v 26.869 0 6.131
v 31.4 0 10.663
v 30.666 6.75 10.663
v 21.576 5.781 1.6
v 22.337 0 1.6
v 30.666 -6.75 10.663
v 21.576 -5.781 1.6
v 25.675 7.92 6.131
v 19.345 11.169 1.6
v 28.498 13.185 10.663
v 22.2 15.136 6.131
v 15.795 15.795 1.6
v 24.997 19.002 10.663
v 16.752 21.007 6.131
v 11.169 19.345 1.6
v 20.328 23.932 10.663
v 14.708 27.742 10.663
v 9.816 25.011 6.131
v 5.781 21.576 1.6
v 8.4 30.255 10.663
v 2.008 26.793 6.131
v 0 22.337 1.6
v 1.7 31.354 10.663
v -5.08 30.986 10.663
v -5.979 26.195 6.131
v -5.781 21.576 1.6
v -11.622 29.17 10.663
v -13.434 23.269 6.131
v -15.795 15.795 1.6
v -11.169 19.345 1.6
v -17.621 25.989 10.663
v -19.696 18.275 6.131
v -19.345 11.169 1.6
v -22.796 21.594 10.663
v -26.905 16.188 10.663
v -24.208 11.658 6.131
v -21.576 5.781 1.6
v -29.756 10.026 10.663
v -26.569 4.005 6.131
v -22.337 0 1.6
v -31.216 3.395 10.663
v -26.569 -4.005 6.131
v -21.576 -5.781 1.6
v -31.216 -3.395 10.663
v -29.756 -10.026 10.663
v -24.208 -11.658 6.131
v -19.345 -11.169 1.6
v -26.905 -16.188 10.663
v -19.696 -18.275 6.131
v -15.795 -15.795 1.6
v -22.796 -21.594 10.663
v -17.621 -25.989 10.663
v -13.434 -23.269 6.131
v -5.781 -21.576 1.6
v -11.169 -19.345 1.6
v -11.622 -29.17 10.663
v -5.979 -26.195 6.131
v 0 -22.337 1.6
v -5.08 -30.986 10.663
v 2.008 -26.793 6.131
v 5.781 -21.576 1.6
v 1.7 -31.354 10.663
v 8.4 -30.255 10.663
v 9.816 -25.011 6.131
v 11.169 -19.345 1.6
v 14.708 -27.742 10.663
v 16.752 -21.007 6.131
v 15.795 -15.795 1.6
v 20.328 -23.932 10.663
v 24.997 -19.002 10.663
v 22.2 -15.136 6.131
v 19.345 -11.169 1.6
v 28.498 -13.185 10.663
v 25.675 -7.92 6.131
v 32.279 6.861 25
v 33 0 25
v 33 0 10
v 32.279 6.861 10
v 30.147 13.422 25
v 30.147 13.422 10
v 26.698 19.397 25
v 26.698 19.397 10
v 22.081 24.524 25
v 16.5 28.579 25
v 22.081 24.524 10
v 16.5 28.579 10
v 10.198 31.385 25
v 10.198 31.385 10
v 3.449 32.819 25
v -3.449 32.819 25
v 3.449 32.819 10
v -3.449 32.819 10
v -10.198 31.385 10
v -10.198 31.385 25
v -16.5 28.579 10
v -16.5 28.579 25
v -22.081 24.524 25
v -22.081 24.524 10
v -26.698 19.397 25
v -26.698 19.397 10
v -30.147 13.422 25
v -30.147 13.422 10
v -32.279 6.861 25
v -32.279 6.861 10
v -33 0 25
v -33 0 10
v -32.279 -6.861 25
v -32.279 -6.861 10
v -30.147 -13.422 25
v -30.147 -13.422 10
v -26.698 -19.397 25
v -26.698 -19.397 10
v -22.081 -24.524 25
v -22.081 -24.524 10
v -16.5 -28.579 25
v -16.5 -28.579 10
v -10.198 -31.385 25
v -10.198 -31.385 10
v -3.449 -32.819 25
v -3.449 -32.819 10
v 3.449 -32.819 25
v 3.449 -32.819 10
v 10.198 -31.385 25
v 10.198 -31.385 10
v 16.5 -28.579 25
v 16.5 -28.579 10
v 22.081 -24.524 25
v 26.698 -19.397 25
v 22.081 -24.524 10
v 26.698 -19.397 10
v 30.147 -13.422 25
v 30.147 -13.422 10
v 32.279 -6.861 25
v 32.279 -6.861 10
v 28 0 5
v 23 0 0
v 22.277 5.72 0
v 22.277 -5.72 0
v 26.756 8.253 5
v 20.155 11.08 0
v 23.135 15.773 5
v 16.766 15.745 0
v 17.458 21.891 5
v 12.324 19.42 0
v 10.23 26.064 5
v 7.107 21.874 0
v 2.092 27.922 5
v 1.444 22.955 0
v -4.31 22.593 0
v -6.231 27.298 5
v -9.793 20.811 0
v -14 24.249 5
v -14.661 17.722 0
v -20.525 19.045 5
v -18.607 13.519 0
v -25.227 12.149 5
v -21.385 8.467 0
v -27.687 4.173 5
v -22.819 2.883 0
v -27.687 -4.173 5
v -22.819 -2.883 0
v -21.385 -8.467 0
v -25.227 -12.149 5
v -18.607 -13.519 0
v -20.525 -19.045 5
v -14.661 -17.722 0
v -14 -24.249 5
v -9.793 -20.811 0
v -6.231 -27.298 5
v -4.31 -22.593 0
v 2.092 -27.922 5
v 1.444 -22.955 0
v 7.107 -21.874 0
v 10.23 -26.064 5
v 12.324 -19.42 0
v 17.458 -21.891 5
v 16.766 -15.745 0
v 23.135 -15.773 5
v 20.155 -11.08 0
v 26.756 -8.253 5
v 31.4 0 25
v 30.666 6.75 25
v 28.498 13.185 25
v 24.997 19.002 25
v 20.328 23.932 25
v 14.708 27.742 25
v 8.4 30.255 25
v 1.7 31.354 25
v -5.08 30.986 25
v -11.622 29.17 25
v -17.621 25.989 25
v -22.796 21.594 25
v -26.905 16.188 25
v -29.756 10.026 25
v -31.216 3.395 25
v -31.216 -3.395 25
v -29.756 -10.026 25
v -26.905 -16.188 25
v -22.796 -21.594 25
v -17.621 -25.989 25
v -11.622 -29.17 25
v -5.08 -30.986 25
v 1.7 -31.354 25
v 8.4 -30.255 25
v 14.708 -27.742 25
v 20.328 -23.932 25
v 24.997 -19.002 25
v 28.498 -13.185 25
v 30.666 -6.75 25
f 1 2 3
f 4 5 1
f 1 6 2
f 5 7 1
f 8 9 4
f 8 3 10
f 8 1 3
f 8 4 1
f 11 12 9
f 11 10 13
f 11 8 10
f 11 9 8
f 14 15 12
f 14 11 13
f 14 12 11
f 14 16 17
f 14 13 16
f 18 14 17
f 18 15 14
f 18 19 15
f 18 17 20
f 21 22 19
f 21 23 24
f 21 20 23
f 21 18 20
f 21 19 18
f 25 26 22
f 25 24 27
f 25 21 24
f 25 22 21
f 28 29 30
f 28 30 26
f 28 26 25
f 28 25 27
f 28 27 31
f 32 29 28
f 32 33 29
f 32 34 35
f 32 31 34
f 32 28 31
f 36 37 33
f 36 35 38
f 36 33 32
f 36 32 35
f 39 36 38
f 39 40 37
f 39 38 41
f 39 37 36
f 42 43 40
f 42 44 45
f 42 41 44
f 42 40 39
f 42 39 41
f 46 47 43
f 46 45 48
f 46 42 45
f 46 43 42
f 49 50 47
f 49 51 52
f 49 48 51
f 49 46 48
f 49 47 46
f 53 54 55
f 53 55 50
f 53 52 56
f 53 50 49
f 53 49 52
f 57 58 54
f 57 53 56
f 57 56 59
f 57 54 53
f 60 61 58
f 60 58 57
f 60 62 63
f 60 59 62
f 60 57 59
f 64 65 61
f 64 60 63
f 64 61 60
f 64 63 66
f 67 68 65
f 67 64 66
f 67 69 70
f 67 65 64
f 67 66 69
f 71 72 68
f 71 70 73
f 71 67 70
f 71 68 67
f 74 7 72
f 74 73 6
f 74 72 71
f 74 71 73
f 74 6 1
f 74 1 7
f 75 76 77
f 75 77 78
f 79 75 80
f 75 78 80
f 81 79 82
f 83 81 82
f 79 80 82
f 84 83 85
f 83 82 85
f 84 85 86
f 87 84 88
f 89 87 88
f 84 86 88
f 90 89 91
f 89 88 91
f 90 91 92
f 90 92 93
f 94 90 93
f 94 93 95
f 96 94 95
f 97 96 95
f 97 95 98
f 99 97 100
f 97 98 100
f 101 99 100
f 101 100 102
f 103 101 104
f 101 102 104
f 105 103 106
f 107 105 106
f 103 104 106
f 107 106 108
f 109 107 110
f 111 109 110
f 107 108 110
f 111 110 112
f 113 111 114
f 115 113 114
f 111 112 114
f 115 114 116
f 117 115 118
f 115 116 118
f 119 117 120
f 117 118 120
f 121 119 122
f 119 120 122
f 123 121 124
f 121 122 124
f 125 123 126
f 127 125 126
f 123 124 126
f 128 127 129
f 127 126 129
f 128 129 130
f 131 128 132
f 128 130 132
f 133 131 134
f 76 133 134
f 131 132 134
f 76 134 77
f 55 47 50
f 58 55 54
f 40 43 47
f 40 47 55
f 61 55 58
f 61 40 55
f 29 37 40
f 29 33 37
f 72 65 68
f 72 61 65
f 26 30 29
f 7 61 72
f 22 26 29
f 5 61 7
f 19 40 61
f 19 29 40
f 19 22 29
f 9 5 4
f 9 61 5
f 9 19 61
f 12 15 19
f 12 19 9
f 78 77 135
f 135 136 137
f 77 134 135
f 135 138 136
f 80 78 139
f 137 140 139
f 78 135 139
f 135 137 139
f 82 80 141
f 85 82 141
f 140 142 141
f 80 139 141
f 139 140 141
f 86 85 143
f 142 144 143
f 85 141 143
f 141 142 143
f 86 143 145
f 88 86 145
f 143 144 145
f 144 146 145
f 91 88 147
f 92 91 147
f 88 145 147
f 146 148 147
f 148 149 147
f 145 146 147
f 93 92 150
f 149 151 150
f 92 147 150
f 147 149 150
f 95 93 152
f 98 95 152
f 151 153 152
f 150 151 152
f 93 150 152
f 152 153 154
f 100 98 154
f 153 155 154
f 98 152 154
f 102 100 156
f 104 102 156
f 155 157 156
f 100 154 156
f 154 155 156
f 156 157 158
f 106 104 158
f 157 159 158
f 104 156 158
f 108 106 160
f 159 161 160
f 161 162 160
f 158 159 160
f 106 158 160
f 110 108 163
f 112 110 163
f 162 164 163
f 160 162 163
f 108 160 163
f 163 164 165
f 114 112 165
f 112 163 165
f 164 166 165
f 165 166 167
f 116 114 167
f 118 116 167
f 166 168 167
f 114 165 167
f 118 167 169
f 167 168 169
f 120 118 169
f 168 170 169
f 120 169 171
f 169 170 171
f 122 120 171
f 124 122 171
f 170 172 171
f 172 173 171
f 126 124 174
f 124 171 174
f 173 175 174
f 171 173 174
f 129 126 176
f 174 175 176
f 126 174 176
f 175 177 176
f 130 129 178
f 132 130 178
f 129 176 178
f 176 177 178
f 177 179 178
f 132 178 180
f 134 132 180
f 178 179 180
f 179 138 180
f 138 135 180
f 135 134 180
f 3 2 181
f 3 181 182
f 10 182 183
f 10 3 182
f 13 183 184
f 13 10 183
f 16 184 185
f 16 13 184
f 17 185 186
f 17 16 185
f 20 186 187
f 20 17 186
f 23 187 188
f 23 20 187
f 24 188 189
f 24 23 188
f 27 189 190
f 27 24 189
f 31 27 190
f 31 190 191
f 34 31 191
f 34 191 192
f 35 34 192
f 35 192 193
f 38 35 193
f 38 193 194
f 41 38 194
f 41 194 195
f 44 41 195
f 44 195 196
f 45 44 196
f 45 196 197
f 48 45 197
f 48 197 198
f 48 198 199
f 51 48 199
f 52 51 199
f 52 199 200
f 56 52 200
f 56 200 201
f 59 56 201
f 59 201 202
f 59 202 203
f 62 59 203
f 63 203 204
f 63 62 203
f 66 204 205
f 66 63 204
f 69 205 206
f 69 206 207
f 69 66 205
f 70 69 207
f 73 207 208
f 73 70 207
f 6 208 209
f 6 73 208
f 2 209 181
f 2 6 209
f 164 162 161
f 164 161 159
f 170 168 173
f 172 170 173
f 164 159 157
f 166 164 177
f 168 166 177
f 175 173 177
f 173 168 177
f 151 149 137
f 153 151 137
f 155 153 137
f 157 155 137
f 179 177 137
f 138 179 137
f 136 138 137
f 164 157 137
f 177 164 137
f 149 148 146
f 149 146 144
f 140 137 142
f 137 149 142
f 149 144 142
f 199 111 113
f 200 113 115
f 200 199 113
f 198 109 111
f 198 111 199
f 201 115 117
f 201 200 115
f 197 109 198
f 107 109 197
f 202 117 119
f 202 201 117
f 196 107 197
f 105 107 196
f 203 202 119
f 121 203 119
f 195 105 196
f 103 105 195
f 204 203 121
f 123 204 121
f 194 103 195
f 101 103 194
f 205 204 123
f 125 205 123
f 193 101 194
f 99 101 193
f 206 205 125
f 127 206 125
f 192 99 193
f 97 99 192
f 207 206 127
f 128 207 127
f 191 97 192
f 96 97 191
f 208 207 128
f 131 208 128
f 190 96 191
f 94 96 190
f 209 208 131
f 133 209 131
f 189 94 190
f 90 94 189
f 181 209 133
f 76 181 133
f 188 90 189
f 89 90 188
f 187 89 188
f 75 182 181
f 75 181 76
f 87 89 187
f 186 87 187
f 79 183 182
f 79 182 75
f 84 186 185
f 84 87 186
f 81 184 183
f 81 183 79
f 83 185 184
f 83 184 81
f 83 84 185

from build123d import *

# Parameters (mm, degrees)
F0_R     = 33
F1_DEPTH = 25
F2_SIZE  = 10
F3_T     = -1.6


with BuildPart() as f1:
    # F0 (on Top) → F1 (new body)
    with BuildSketch(Plane.XY):
        Circle(F0_R)
    extrude(amount=F1_DEPTH)

    # F2
    f2_edges = [f1.edges().sort_by_distance(p)[0] for p in [
        (-33, 0, 0),
    ]]
    chamfer(f2_edges, length=F2_SIZE)

    # F3
    f3_openings = [f1.faces().sort_by_distance(p)[0] for p in [
        (0, 0, 25),
    ]]
    offset(amount=F3_T, openings=f3_openings)


solid = f1.part
